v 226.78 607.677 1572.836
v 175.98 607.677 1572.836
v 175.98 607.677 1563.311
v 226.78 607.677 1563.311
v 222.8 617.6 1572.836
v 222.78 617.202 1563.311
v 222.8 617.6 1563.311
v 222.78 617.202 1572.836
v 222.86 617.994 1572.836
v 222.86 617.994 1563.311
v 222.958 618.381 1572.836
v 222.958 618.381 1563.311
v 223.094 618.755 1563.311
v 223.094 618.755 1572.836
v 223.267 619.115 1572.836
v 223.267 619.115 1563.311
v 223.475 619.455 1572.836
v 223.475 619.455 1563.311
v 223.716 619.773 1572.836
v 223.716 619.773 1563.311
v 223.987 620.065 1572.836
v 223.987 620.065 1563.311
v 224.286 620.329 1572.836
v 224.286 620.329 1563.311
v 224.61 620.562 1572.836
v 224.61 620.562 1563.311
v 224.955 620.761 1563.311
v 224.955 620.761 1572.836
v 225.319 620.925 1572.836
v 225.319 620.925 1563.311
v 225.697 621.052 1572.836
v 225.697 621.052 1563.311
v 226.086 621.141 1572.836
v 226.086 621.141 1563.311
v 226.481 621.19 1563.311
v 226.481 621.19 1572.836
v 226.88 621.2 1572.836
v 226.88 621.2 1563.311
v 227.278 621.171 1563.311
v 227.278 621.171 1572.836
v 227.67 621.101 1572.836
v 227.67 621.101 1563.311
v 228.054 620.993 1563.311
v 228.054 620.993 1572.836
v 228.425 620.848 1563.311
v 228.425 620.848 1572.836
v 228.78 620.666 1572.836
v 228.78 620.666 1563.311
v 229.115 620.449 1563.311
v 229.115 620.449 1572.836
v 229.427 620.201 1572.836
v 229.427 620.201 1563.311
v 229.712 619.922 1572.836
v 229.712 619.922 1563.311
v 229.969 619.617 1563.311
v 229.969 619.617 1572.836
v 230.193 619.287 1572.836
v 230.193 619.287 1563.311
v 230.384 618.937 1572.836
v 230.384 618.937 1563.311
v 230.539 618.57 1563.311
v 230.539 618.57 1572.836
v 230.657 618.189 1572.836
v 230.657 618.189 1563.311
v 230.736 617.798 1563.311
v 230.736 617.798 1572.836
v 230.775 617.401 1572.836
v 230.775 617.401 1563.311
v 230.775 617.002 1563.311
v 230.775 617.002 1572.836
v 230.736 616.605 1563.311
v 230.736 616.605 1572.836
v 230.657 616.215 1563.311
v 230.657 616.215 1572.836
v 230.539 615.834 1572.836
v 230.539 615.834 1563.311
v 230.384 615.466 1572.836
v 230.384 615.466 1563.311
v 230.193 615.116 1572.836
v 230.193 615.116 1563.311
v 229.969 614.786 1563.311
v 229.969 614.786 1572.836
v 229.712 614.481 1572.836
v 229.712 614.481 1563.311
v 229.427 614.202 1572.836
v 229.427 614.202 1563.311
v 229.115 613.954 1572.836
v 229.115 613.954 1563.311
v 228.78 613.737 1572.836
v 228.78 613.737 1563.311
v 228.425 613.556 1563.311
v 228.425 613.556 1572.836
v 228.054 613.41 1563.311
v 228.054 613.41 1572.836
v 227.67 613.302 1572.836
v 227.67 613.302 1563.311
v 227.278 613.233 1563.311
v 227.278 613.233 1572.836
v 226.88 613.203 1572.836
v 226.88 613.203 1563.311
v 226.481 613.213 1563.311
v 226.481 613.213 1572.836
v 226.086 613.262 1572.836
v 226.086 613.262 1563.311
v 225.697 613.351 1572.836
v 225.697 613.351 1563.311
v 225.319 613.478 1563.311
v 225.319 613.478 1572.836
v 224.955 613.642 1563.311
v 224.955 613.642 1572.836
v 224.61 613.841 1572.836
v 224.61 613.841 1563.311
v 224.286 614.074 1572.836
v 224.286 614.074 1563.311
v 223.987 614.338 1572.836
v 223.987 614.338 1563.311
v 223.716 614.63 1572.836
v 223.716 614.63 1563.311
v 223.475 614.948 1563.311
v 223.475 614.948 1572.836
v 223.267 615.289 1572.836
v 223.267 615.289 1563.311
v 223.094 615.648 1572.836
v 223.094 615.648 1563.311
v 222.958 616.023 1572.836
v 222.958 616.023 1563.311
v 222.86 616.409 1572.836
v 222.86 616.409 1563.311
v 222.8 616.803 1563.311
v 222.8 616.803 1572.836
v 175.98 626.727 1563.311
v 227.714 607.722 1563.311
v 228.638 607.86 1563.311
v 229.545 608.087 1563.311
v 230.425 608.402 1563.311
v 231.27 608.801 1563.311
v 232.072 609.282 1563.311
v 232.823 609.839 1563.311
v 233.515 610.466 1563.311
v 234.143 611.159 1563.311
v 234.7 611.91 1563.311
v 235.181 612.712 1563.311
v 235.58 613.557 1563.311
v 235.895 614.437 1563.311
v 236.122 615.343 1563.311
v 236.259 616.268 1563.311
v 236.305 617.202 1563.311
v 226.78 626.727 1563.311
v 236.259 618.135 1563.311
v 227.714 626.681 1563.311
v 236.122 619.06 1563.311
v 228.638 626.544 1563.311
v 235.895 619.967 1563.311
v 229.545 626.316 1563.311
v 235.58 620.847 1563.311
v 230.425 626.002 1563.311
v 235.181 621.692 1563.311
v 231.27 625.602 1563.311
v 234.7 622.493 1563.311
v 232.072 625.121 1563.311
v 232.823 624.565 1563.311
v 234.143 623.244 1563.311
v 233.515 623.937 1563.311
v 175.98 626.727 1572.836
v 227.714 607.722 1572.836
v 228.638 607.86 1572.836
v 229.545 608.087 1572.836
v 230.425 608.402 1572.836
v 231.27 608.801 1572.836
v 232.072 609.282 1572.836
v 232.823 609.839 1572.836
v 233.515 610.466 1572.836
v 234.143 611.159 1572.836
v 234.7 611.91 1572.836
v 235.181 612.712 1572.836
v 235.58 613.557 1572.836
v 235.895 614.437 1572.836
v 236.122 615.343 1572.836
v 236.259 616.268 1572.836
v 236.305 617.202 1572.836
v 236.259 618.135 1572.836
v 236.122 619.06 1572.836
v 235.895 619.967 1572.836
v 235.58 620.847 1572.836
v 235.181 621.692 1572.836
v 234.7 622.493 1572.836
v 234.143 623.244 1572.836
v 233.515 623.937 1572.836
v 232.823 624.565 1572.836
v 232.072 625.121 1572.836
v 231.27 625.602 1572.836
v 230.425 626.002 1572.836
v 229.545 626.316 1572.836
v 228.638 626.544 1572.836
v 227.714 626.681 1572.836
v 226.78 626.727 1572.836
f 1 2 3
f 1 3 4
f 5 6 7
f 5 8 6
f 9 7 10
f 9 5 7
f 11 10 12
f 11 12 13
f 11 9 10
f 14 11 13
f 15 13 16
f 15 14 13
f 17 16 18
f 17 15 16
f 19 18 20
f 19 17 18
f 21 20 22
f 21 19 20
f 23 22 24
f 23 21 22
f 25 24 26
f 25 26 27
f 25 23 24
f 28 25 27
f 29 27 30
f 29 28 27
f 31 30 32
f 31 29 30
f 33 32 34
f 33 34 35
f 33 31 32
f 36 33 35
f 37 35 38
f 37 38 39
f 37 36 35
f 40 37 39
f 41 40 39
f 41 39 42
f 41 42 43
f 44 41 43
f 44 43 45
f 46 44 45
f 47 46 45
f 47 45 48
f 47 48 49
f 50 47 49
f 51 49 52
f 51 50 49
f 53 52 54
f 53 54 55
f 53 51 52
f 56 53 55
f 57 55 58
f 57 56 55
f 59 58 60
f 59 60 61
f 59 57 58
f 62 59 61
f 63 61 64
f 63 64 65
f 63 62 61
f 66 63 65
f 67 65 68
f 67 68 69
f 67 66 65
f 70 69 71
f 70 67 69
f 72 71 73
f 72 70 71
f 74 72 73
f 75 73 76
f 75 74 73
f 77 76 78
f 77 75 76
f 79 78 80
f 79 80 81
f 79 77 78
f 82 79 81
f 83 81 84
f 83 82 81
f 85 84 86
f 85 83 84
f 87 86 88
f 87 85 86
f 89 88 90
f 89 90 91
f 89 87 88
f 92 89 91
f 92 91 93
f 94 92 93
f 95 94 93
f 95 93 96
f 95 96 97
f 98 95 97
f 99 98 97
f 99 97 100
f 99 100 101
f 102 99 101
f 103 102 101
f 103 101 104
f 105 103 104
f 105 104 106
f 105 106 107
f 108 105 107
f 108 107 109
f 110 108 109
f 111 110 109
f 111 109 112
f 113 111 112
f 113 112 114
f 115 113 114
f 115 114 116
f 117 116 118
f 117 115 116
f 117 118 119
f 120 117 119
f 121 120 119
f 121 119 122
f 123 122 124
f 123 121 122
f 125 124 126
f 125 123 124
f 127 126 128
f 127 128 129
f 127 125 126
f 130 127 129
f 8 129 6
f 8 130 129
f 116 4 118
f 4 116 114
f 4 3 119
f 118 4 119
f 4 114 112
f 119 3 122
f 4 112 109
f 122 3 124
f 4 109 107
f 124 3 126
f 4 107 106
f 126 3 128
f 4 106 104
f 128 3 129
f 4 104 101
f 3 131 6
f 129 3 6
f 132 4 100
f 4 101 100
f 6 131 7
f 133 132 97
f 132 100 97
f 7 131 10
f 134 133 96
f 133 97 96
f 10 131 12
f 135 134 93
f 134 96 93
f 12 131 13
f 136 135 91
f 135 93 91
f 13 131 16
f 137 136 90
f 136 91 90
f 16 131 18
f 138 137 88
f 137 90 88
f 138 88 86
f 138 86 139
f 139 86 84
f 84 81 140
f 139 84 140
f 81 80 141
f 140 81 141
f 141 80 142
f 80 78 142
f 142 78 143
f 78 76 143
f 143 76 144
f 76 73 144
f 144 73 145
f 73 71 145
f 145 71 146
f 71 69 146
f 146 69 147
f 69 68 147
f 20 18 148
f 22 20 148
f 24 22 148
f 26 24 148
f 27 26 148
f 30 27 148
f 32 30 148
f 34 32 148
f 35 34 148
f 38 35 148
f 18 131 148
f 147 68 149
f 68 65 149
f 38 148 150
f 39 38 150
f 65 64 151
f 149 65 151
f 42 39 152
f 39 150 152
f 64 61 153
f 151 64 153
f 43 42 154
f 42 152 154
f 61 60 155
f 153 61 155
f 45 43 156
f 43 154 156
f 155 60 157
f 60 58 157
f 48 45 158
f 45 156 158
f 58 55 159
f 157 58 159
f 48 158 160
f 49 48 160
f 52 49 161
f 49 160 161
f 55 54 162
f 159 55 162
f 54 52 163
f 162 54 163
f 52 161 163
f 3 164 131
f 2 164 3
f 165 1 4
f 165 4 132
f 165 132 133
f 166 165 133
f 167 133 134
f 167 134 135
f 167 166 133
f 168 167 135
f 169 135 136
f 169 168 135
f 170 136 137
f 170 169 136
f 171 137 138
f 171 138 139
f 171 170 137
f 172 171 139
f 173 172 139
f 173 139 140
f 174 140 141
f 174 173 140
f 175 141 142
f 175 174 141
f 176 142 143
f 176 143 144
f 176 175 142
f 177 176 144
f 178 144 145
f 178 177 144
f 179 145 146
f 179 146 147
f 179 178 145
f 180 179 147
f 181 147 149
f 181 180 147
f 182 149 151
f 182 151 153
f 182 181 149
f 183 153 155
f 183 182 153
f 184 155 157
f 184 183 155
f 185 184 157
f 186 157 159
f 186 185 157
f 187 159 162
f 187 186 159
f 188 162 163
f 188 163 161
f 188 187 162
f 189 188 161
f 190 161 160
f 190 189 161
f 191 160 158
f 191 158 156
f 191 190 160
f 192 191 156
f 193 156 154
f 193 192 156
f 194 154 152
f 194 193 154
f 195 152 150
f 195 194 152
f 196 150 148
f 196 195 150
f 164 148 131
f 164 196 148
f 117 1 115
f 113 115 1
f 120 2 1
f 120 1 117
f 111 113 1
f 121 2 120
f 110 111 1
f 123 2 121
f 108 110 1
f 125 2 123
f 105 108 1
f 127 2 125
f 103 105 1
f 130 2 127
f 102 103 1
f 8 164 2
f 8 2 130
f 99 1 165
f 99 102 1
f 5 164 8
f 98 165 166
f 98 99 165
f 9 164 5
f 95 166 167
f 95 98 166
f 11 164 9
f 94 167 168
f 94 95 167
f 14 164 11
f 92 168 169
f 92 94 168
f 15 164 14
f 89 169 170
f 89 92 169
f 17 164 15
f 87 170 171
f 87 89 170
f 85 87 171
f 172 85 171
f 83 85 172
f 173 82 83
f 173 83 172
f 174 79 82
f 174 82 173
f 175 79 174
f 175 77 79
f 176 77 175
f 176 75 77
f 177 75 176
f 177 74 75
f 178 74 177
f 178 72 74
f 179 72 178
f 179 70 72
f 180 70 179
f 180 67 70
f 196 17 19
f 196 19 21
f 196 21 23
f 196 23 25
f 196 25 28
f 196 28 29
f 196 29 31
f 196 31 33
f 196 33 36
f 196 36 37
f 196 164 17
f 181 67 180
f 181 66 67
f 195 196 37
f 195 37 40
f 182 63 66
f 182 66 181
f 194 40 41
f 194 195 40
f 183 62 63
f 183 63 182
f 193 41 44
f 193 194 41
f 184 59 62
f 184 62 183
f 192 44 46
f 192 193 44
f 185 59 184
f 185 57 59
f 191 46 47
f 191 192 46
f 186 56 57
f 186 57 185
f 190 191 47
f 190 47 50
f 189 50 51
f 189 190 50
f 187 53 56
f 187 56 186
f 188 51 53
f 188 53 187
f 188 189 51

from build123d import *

# Parameters (mm, degrees)
BOSS_EXTRUDE1_DEPTH      = 4.7625
BOSS_EXTRUDE1_DEPTH_BACK = 4.7625


with BuildPart() as part:
    # Sketch1 → Boss-Extrude1 (new, two sides: drawn at the far end of the back side and taken through both)
    with BuildSketch(Plane.XY.offset(1568.073662845).offset(-BOSS_EXTRUDE1_DEPTH_BACK)):
        with BuildLine():
            Line((175.980244033, 626.72659627), (175.980244033, 617.20159627))
            Line((175.980244033, 617.20159627), (175.980244033, 607.67659627))
            Line((175.980244033, 607.67659627), (226.780244033, 607.67659627))
            ThreePointArc((226.780244033, 607.67659627), (236.305244033, 617.20159627), (226.780244033, 626.72659627))
            Line((226.780244033, 626.72659627), (175.980244033, 626.72659627))
        make_face()
        with BuildLine():
            ThreePointArc((230.780244033, 617.20159627), (226.780244033, 613.20159627), (222.780244033, 617.20159627))
            ThreePointArc((222.780244033, 617.20159627), (226.780244033, 621.20159627), (230.780244033, 617.20159627))
        make_face(mode=Mode.SUBTRACT)
    extrude(amount=BOSS_EXTRUDE1_DEPTH + BOSS_EXTRUDE1_DEPTH_BACK)


solid = part.part
